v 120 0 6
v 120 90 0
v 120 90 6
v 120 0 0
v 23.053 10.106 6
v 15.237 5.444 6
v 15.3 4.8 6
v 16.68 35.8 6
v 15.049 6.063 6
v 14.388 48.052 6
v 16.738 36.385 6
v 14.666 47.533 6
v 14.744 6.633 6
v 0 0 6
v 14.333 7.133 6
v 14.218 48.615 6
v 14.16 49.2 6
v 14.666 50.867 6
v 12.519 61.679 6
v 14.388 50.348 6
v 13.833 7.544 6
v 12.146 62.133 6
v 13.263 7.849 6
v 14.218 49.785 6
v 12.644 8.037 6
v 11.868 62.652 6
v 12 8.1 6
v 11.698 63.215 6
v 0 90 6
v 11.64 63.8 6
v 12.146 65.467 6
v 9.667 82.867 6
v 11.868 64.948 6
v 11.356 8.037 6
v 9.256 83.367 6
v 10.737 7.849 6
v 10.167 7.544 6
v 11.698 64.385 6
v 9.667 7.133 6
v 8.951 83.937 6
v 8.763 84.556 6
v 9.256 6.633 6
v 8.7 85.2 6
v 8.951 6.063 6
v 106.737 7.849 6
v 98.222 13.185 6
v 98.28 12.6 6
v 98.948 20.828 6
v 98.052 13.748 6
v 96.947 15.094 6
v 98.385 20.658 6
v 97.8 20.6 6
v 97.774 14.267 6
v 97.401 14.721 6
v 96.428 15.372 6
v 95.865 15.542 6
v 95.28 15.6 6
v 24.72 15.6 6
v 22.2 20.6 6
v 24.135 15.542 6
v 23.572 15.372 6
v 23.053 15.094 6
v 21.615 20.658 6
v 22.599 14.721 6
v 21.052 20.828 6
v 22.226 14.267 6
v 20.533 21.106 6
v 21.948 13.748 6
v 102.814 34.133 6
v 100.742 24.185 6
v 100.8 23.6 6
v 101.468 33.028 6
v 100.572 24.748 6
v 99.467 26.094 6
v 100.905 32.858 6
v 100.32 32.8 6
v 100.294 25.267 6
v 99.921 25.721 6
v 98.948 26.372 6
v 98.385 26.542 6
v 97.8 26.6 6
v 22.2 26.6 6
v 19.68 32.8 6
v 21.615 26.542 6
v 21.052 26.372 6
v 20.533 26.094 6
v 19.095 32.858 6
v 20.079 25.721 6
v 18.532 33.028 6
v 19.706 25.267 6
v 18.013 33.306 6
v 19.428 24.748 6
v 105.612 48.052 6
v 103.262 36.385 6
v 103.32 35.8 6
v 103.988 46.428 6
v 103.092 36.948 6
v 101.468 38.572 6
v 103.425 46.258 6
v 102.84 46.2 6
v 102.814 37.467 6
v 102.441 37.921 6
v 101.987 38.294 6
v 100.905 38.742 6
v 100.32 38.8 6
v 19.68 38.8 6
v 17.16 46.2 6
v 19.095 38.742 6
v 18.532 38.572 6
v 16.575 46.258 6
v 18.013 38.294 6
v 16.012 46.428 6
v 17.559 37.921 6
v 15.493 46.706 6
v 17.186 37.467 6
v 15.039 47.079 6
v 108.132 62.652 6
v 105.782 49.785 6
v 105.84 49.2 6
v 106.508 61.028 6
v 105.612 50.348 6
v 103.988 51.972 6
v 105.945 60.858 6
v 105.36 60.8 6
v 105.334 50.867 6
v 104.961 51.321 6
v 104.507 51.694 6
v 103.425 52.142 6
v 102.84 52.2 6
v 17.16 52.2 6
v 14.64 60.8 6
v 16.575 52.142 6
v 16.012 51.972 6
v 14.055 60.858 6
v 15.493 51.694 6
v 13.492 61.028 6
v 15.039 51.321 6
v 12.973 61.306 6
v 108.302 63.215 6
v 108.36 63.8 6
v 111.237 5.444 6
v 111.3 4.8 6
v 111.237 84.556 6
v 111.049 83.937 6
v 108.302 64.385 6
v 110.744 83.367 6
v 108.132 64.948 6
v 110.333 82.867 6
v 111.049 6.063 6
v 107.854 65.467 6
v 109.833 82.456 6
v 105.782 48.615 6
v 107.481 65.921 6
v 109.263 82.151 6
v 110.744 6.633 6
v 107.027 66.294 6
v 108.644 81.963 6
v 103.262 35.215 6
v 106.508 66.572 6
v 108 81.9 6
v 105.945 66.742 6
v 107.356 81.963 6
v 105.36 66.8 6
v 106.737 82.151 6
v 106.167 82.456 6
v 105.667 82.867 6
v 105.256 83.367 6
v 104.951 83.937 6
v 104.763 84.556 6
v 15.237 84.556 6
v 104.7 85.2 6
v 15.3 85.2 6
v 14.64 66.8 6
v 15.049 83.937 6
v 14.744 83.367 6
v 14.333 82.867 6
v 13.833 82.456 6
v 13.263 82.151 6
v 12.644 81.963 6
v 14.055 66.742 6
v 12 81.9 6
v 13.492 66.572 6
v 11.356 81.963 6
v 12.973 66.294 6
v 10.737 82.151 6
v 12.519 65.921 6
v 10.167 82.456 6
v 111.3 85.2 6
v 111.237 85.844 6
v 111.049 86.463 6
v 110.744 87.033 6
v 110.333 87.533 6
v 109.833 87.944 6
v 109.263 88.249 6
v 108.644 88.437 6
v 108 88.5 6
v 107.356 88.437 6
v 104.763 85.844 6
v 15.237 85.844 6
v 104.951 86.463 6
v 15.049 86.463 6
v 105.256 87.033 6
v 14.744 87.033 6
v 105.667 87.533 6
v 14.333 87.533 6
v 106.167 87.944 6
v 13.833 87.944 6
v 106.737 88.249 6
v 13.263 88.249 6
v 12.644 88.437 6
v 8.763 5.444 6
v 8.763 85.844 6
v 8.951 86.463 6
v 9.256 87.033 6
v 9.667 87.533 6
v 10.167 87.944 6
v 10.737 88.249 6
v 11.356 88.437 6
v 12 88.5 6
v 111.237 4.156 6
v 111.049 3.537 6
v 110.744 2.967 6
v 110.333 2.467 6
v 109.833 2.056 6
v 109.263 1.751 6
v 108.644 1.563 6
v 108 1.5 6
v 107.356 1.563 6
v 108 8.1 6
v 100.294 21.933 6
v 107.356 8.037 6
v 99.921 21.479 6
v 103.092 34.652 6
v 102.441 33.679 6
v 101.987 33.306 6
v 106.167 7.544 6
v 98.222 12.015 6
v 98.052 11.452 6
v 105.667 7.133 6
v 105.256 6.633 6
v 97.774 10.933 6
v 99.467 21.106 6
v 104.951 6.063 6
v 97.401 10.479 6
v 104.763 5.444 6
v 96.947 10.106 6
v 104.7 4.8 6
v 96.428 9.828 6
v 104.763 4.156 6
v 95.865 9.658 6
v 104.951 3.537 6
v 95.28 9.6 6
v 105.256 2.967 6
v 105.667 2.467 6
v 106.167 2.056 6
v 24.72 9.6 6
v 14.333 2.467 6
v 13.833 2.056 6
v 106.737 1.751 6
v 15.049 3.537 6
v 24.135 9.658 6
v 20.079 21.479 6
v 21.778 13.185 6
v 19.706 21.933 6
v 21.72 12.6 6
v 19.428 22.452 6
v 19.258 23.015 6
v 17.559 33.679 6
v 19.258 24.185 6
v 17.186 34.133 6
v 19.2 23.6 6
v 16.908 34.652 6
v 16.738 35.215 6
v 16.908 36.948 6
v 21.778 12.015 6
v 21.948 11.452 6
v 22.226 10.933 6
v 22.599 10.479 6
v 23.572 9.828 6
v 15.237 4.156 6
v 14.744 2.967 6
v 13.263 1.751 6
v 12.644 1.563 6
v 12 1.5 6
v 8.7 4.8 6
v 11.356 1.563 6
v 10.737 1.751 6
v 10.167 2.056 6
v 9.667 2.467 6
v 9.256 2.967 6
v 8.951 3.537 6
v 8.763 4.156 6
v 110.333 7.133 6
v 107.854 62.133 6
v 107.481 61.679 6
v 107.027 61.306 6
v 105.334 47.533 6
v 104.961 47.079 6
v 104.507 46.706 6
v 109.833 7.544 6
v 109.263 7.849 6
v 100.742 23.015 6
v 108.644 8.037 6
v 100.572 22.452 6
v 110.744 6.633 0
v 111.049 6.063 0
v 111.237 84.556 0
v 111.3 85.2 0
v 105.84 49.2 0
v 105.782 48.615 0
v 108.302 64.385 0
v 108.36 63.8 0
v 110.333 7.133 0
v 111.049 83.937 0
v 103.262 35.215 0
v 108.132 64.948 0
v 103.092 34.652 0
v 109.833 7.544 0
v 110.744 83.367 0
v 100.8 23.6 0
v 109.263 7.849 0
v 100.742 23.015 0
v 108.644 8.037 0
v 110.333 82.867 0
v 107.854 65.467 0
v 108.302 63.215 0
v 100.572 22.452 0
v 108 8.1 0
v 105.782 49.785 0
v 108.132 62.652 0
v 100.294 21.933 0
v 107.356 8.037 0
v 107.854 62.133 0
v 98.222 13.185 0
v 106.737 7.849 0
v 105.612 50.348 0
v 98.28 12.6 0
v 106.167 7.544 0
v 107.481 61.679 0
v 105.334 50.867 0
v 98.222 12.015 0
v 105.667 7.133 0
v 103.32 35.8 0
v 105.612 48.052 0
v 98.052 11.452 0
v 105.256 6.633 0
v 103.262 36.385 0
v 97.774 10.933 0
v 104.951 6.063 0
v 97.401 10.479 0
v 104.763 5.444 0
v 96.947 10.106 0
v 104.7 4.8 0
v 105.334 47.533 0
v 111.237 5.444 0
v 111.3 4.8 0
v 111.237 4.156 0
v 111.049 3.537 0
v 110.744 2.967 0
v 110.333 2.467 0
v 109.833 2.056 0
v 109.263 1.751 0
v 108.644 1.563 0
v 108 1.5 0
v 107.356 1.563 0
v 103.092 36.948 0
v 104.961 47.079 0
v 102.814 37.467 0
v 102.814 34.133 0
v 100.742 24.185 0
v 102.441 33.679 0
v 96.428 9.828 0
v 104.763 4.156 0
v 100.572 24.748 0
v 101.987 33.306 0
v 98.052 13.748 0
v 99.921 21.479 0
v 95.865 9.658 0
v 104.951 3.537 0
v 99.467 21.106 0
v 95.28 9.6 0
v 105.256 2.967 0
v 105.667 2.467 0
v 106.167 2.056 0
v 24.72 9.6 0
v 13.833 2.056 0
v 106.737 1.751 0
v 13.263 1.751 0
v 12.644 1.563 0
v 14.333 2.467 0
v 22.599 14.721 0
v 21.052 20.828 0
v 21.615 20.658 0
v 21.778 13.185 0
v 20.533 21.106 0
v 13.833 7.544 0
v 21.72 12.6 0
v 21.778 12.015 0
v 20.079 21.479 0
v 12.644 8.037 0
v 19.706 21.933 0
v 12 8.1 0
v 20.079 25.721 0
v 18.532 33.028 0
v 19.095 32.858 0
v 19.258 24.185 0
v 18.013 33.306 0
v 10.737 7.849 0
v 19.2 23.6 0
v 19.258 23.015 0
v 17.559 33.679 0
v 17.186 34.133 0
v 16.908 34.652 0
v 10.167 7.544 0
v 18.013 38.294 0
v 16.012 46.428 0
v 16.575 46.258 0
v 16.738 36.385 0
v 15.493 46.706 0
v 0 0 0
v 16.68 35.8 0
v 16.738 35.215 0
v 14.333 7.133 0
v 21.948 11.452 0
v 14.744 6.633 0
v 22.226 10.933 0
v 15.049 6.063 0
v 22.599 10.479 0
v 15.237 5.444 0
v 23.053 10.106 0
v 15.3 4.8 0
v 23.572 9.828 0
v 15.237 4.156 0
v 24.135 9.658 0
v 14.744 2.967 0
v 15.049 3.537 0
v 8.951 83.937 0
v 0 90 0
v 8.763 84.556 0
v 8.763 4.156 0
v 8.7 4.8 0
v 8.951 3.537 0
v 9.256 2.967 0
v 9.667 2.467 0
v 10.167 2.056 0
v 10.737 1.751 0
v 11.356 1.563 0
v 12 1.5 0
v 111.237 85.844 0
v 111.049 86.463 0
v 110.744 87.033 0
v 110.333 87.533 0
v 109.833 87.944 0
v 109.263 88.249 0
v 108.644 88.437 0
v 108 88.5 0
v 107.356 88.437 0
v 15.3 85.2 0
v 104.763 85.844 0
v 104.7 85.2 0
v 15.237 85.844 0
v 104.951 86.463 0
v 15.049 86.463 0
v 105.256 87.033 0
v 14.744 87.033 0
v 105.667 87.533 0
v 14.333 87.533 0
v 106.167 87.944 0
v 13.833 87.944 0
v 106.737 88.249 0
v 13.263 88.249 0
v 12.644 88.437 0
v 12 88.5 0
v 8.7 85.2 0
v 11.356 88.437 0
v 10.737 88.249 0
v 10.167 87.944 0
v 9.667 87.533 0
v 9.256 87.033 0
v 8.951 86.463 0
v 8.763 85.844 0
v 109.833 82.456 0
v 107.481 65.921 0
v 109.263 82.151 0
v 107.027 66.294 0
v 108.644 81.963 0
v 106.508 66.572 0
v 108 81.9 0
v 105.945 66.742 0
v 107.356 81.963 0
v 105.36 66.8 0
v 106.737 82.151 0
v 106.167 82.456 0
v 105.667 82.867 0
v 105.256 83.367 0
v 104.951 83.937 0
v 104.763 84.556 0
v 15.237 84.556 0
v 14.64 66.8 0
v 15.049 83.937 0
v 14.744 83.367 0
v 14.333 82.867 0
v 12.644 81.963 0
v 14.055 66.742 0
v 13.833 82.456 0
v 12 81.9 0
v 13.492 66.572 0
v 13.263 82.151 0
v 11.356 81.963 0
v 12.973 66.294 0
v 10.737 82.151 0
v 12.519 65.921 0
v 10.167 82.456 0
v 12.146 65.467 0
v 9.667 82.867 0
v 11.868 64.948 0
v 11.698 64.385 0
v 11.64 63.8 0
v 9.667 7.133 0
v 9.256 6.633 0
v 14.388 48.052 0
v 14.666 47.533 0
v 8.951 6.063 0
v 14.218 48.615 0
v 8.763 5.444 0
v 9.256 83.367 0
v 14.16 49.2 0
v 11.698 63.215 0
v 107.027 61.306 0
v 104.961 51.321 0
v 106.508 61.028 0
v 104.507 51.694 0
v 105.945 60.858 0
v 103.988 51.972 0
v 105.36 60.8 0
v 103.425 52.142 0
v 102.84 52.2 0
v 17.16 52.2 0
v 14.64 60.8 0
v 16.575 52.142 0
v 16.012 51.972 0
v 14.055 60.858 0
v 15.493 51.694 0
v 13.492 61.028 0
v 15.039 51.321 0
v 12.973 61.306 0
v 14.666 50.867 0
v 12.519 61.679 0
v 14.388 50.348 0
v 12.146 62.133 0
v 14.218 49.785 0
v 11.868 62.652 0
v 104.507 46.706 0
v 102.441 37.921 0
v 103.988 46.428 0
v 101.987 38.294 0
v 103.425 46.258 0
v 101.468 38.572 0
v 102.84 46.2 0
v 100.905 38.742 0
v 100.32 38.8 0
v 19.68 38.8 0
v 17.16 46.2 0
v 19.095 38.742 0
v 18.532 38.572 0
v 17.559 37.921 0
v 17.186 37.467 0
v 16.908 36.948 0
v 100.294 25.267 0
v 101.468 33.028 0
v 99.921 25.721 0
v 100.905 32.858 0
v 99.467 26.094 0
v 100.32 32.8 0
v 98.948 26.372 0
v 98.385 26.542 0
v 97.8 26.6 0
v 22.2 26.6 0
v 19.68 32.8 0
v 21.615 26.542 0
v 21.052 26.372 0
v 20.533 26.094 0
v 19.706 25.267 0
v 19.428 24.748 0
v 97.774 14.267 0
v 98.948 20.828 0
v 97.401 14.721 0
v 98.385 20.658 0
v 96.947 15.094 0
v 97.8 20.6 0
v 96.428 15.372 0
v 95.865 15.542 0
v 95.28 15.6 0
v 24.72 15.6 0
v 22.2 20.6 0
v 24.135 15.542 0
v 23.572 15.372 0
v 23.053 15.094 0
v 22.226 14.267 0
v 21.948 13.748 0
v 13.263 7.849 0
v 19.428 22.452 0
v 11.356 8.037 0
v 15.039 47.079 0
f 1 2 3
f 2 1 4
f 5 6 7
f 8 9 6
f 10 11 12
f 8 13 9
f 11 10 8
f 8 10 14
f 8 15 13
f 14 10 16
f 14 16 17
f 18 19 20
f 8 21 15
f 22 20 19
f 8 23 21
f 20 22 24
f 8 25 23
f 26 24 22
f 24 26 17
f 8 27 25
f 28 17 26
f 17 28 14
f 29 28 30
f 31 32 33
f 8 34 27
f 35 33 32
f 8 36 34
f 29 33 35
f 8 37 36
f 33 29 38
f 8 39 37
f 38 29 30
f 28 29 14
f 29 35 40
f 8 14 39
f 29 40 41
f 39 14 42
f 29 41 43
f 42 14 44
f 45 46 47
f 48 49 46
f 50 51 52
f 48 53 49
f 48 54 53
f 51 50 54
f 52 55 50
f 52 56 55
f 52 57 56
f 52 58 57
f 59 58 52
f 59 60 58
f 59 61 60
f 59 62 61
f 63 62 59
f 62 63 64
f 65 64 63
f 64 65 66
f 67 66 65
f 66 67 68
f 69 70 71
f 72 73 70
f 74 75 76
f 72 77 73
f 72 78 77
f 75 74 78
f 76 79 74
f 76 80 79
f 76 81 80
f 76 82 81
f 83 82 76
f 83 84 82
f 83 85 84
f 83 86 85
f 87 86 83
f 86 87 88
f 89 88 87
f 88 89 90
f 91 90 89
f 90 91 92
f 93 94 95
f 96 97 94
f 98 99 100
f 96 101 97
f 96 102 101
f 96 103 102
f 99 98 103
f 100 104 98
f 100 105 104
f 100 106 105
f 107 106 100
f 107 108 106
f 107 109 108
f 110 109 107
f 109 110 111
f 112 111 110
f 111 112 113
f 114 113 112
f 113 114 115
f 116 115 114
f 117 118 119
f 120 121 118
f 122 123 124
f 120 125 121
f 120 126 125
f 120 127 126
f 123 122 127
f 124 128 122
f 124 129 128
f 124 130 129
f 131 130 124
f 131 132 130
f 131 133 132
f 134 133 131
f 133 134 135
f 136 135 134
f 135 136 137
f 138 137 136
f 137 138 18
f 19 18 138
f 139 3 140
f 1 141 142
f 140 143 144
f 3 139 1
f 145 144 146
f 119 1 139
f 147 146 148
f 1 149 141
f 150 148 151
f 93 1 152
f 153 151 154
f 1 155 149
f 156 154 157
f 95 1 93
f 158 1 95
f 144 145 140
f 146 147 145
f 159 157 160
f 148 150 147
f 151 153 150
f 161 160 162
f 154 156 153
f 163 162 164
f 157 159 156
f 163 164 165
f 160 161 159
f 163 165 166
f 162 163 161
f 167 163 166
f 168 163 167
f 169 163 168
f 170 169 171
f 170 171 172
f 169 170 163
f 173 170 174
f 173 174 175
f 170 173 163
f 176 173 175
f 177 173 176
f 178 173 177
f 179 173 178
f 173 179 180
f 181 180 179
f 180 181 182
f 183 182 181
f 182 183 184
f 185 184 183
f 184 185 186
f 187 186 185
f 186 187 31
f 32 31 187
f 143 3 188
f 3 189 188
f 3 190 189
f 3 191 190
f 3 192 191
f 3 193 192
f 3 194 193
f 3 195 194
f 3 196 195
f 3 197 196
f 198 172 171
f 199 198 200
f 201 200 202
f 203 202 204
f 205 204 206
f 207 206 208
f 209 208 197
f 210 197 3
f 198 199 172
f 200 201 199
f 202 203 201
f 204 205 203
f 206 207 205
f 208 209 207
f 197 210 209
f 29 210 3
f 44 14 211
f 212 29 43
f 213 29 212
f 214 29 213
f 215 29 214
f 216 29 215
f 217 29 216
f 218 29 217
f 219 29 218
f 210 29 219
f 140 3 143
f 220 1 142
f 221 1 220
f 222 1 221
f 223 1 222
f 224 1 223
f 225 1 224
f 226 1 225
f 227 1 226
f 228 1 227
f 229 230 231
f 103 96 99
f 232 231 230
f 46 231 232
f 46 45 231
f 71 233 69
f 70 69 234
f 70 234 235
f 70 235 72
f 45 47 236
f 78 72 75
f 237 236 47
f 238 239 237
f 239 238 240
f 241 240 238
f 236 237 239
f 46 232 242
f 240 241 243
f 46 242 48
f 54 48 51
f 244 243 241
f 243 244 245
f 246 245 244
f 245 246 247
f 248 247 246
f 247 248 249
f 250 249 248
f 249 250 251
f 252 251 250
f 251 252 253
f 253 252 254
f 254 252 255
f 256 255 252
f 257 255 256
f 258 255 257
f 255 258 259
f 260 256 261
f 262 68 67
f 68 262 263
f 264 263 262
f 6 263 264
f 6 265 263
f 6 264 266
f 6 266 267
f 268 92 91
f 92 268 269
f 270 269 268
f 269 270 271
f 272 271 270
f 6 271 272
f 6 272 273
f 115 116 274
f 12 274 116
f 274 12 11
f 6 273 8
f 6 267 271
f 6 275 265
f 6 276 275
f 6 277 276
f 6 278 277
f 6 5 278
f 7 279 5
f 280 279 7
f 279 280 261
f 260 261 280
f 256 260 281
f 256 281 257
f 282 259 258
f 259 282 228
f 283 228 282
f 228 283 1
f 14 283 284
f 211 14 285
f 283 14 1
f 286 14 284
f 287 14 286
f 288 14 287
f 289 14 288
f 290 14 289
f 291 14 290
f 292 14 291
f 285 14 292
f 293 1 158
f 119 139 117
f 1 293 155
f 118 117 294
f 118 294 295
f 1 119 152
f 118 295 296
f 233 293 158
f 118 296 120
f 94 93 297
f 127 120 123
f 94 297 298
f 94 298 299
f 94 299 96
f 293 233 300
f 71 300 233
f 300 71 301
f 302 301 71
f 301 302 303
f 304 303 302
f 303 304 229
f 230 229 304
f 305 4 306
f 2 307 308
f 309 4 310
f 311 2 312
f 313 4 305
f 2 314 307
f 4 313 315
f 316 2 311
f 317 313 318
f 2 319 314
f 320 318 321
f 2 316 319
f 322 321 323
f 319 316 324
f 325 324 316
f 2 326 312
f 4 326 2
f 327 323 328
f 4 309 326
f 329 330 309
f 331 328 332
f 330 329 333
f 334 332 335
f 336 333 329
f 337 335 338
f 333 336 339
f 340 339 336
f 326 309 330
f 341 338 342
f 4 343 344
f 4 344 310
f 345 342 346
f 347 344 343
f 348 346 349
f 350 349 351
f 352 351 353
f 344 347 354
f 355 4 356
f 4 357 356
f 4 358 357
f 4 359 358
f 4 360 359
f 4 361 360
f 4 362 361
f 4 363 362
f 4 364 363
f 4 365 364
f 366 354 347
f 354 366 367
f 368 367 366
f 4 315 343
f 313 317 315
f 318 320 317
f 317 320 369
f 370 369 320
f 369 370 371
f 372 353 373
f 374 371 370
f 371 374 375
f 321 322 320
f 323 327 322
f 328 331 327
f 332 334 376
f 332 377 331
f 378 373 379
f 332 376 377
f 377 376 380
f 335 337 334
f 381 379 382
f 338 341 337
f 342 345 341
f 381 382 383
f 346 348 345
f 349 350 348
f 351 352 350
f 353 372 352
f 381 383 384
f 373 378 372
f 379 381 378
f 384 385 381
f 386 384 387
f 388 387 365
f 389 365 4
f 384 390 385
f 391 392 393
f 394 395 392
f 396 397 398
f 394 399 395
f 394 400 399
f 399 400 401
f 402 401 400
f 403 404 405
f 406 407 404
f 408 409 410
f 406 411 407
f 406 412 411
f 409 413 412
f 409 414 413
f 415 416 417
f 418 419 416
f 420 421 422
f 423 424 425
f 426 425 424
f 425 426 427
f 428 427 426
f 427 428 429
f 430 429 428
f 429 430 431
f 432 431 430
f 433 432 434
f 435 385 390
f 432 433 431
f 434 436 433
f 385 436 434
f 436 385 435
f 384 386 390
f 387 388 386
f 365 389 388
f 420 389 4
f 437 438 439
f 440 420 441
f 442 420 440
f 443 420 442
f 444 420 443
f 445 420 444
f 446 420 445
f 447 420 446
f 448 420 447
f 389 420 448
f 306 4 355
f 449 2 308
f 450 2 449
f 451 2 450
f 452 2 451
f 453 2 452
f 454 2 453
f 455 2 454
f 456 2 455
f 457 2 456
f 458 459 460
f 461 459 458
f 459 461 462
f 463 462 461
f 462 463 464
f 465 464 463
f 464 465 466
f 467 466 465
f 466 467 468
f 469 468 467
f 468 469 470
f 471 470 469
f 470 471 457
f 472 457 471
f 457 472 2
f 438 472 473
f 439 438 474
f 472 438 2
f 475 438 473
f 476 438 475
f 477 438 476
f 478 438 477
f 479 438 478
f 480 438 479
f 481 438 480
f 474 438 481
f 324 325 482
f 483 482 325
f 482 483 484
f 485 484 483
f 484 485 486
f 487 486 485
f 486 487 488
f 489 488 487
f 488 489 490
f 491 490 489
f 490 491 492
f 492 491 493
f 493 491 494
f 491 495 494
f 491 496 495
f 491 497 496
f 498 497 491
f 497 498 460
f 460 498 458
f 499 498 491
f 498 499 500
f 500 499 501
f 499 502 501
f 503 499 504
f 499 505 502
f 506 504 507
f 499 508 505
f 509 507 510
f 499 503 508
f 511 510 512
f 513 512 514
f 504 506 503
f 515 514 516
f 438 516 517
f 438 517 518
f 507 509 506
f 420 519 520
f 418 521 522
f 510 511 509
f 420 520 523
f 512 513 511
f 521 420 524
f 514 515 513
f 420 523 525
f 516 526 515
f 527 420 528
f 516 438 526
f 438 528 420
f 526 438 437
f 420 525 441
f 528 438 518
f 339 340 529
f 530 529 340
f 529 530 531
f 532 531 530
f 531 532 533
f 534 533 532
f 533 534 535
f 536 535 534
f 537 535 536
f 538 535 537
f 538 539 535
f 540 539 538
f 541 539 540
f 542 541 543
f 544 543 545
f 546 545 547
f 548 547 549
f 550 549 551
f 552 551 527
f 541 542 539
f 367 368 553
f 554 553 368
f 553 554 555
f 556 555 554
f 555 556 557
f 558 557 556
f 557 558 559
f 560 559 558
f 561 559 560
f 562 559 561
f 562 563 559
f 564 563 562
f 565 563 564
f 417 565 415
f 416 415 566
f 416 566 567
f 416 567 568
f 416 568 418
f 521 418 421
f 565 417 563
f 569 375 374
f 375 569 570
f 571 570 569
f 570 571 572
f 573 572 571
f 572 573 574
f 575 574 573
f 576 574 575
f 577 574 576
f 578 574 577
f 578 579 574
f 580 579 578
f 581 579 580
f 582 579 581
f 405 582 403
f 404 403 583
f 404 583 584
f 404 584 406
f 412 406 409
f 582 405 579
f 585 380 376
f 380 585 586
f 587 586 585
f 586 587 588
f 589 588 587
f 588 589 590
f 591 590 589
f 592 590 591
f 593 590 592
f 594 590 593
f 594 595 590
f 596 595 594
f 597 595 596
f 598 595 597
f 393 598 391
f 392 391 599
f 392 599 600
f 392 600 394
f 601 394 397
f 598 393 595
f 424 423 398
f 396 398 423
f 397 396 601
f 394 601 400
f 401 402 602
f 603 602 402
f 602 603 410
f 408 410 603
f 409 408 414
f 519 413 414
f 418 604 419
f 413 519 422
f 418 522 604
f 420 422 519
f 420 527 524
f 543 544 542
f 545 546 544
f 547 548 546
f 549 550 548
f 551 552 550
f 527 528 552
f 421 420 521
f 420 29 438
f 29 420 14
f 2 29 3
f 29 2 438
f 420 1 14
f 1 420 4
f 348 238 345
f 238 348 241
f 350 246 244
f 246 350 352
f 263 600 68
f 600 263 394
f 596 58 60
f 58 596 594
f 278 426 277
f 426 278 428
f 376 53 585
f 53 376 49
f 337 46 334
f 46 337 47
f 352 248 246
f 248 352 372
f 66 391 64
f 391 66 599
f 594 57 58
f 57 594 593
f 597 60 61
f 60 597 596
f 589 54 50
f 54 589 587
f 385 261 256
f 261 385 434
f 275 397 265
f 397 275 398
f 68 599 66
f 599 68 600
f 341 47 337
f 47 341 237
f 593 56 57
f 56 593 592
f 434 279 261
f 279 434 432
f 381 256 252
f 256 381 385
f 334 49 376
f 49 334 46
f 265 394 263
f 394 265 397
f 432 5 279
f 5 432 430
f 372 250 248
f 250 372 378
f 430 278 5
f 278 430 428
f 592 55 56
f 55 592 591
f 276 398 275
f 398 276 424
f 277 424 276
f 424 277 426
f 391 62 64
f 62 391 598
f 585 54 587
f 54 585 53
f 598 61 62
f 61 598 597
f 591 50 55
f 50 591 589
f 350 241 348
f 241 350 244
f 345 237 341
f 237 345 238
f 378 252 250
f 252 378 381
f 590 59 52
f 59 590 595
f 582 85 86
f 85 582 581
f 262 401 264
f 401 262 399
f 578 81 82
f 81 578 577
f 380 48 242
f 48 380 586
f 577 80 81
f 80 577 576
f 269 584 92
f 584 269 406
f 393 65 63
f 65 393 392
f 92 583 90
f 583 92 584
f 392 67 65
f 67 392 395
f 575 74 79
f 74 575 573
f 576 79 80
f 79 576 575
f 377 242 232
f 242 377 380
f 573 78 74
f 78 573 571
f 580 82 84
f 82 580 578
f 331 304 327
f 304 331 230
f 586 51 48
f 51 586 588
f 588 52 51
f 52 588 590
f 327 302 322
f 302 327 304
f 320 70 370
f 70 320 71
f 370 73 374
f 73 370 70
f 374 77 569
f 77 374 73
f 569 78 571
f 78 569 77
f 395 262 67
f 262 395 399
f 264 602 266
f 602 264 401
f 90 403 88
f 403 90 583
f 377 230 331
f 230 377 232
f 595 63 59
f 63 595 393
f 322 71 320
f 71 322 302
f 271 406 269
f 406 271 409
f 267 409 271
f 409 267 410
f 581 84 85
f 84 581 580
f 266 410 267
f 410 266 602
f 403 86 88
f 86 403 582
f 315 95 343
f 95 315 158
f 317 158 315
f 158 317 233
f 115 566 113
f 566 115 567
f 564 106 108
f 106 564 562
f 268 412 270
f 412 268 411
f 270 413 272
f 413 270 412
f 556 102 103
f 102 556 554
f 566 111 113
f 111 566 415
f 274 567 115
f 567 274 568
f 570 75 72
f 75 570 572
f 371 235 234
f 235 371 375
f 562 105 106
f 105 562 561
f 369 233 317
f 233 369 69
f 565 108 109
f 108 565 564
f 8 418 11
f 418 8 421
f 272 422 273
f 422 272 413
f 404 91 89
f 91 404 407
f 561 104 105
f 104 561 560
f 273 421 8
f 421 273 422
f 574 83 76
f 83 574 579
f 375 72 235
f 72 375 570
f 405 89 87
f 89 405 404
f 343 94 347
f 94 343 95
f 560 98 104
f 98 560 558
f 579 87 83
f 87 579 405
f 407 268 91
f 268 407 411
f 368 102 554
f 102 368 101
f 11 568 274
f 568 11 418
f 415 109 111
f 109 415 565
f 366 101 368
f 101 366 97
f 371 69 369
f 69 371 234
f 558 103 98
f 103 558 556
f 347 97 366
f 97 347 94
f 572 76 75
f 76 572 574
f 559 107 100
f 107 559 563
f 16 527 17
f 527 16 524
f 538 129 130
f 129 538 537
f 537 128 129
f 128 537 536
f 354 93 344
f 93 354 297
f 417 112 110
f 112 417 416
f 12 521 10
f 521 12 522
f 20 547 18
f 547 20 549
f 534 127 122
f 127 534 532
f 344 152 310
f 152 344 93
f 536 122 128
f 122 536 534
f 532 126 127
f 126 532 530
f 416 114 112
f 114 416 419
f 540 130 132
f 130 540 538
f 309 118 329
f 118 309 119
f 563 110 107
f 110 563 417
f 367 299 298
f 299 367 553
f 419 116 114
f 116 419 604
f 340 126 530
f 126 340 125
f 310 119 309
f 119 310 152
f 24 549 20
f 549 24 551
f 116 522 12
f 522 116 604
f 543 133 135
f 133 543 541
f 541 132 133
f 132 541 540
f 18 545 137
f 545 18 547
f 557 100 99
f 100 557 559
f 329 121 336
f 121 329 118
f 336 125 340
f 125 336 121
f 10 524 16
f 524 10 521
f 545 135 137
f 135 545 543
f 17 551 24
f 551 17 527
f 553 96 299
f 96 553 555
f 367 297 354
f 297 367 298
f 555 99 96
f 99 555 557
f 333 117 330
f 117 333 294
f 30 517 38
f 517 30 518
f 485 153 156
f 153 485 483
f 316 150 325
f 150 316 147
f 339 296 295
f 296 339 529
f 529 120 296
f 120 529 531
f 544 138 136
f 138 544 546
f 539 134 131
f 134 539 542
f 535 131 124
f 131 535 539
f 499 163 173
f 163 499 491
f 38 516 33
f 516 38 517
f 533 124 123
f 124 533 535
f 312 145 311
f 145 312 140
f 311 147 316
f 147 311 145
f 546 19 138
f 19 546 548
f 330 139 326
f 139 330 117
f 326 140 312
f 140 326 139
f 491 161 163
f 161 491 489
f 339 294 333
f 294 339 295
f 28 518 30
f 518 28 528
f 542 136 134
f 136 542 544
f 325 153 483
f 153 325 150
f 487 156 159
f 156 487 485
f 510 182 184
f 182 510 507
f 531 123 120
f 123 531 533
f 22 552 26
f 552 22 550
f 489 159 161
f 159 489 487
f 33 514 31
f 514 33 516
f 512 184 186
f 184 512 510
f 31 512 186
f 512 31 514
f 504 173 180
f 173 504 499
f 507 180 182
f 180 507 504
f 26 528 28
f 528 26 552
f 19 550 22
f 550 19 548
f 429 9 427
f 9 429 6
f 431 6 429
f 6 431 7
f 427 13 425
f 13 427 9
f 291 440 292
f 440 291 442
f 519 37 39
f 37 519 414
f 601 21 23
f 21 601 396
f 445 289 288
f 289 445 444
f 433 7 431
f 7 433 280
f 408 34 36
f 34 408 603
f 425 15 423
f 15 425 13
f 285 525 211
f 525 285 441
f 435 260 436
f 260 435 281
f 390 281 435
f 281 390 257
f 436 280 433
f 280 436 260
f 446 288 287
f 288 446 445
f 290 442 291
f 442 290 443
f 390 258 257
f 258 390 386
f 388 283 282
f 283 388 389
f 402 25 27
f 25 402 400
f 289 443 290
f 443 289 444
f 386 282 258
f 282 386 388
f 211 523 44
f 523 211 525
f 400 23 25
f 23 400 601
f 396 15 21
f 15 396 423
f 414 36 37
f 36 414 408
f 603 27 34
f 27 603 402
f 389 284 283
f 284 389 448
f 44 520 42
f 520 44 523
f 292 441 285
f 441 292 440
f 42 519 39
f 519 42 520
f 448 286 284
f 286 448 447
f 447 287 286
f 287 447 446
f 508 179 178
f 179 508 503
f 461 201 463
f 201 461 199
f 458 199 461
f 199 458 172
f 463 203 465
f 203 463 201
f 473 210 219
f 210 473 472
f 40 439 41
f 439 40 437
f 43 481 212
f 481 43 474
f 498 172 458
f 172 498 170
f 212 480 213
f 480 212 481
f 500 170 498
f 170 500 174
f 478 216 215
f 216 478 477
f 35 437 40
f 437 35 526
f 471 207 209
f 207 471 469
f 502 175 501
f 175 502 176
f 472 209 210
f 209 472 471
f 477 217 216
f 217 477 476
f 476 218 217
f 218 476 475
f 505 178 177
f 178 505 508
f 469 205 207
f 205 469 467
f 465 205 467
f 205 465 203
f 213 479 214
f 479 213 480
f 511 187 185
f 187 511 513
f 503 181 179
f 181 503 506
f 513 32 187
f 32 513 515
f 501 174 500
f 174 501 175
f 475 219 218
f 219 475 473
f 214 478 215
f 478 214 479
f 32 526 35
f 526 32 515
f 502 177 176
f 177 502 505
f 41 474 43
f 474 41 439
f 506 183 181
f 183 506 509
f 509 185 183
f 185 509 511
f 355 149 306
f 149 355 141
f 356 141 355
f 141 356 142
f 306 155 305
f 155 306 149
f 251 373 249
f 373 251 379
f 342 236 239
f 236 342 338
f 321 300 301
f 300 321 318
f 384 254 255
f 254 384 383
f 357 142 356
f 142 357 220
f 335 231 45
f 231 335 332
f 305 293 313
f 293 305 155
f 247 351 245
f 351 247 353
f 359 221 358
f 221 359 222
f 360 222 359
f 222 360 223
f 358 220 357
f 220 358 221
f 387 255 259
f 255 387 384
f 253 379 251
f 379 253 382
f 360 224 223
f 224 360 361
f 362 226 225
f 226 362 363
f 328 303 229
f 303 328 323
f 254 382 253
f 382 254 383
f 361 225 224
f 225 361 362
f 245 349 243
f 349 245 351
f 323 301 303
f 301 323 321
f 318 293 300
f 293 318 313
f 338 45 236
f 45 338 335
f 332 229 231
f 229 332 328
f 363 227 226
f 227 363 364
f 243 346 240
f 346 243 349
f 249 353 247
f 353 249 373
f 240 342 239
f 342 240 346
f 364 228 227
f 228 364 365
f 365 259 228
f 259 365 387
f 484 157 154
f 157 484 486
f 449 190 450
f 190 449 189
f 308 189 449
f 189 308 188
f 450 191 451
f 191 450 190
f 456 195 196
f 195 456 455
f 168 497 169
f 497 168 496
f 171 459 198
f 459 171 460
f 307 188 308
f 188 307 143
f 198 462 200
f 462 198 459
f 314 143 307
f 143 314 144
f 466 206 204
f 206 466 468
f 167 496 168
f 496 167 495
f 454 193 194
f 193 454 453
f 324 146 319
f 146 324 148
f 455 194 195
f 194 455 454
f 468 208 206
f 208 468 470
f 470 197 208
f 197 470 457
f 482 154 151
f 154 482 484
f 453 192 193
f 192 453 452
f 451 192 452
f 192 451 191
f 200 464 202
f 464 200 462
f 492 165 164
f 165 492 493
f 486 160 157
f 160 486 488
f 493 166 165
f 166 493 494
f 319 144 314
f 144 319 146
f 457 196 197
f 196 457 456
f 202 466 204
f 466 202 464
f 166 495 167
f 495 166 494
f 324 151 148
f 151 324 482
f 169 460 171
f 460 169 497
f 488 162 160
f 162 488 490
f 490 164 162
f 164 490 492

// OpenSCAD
$fn = 32;

// ----------------------------------------------------------------------
// Slotted panel: 120 x 90 mm, 5 рядов of slots
// ----------------------------------------------------------------------

// --- parameters (mm) ---
panel_w = 120;            // panel width
panel_d = 90;             // panel depth
thick = 6;                // panel thickness
slot_w = 6;               // slot width
pitch0 = 11;              // first row pitch
pitch_step = 1.2;         // pitch increase per row
margin = 9.6;             // margin around the slot field
rows = 5;                 // number of slot rows
mount_d = 6.6;            // mounting holes
mount_x = 48;             // mounting hole offset

difference() {
  union() {
    cube([panel_w, panel_d, thick]);
  }
  /* slot rows: stadium shaped cutters, 2.5 mm clear of both faces */
  /* row 0: pitch 11, length 70.56 */
  hull() {
    translate([24.72, 12.6, -2.5]) cylinder(h = thick + 5, d = slot_w);
    translate([95.28, 12.6, -2.5]) cylinder(h = thick + 5, d = slot_w);
  }
  /* row 1: pitch 12.2, length 75.6 */
  hull() {
    translate([22.2, 23.6, -2.5]) cylinder(h = thick + 5, d = slot_w);
    translate([97.8, 23.6, -2.5]) cylinder(h = thick + 5, d = slot_w);
  }
  /* row 2: pitch 13.4, length 80.64 */
  hull() {
    translate([19.68, 35.8, -2.5]) cylinder(h = thick + 5, d = slot_w);
    translate([100.32, 35.8, -2.5]) cylinder(h = thick + 5, d = slot_w);
  }
  /* row 3: pitch 14.6, length 85.68 */
  hull() {
    translate([17.16, 49.2, -2.5]) cylinder(h = thick + 5, d = slot_w);
    translate([102.84, 49.2, -2.5]) cylinder(h = thick + 5, d = slot_w);
  }
  /* row 4: pitch 15.8, length 90.72 */
  hull() {
    translate([14.64, 63.8, -2.5]) cylinder(h = thick + 5, d = slot_w);
    translate([105.36, 63.8, -2.5]) cylinder(h = thick + 5, d = slot_w);
  }
  translate([12, 4.8, -2.5]) cylinder(h = 11, d = mount_d);
  translate([12, 85.2, -2.5]) cylinder(h = 11, d = mount_d);
  translate([108, 4.8, -2.5]) cylinder(h = 11, d = mount_d);
  translate([108, 85.2, -2.5]) cylinder(h = 11, d = mount_d);
}
